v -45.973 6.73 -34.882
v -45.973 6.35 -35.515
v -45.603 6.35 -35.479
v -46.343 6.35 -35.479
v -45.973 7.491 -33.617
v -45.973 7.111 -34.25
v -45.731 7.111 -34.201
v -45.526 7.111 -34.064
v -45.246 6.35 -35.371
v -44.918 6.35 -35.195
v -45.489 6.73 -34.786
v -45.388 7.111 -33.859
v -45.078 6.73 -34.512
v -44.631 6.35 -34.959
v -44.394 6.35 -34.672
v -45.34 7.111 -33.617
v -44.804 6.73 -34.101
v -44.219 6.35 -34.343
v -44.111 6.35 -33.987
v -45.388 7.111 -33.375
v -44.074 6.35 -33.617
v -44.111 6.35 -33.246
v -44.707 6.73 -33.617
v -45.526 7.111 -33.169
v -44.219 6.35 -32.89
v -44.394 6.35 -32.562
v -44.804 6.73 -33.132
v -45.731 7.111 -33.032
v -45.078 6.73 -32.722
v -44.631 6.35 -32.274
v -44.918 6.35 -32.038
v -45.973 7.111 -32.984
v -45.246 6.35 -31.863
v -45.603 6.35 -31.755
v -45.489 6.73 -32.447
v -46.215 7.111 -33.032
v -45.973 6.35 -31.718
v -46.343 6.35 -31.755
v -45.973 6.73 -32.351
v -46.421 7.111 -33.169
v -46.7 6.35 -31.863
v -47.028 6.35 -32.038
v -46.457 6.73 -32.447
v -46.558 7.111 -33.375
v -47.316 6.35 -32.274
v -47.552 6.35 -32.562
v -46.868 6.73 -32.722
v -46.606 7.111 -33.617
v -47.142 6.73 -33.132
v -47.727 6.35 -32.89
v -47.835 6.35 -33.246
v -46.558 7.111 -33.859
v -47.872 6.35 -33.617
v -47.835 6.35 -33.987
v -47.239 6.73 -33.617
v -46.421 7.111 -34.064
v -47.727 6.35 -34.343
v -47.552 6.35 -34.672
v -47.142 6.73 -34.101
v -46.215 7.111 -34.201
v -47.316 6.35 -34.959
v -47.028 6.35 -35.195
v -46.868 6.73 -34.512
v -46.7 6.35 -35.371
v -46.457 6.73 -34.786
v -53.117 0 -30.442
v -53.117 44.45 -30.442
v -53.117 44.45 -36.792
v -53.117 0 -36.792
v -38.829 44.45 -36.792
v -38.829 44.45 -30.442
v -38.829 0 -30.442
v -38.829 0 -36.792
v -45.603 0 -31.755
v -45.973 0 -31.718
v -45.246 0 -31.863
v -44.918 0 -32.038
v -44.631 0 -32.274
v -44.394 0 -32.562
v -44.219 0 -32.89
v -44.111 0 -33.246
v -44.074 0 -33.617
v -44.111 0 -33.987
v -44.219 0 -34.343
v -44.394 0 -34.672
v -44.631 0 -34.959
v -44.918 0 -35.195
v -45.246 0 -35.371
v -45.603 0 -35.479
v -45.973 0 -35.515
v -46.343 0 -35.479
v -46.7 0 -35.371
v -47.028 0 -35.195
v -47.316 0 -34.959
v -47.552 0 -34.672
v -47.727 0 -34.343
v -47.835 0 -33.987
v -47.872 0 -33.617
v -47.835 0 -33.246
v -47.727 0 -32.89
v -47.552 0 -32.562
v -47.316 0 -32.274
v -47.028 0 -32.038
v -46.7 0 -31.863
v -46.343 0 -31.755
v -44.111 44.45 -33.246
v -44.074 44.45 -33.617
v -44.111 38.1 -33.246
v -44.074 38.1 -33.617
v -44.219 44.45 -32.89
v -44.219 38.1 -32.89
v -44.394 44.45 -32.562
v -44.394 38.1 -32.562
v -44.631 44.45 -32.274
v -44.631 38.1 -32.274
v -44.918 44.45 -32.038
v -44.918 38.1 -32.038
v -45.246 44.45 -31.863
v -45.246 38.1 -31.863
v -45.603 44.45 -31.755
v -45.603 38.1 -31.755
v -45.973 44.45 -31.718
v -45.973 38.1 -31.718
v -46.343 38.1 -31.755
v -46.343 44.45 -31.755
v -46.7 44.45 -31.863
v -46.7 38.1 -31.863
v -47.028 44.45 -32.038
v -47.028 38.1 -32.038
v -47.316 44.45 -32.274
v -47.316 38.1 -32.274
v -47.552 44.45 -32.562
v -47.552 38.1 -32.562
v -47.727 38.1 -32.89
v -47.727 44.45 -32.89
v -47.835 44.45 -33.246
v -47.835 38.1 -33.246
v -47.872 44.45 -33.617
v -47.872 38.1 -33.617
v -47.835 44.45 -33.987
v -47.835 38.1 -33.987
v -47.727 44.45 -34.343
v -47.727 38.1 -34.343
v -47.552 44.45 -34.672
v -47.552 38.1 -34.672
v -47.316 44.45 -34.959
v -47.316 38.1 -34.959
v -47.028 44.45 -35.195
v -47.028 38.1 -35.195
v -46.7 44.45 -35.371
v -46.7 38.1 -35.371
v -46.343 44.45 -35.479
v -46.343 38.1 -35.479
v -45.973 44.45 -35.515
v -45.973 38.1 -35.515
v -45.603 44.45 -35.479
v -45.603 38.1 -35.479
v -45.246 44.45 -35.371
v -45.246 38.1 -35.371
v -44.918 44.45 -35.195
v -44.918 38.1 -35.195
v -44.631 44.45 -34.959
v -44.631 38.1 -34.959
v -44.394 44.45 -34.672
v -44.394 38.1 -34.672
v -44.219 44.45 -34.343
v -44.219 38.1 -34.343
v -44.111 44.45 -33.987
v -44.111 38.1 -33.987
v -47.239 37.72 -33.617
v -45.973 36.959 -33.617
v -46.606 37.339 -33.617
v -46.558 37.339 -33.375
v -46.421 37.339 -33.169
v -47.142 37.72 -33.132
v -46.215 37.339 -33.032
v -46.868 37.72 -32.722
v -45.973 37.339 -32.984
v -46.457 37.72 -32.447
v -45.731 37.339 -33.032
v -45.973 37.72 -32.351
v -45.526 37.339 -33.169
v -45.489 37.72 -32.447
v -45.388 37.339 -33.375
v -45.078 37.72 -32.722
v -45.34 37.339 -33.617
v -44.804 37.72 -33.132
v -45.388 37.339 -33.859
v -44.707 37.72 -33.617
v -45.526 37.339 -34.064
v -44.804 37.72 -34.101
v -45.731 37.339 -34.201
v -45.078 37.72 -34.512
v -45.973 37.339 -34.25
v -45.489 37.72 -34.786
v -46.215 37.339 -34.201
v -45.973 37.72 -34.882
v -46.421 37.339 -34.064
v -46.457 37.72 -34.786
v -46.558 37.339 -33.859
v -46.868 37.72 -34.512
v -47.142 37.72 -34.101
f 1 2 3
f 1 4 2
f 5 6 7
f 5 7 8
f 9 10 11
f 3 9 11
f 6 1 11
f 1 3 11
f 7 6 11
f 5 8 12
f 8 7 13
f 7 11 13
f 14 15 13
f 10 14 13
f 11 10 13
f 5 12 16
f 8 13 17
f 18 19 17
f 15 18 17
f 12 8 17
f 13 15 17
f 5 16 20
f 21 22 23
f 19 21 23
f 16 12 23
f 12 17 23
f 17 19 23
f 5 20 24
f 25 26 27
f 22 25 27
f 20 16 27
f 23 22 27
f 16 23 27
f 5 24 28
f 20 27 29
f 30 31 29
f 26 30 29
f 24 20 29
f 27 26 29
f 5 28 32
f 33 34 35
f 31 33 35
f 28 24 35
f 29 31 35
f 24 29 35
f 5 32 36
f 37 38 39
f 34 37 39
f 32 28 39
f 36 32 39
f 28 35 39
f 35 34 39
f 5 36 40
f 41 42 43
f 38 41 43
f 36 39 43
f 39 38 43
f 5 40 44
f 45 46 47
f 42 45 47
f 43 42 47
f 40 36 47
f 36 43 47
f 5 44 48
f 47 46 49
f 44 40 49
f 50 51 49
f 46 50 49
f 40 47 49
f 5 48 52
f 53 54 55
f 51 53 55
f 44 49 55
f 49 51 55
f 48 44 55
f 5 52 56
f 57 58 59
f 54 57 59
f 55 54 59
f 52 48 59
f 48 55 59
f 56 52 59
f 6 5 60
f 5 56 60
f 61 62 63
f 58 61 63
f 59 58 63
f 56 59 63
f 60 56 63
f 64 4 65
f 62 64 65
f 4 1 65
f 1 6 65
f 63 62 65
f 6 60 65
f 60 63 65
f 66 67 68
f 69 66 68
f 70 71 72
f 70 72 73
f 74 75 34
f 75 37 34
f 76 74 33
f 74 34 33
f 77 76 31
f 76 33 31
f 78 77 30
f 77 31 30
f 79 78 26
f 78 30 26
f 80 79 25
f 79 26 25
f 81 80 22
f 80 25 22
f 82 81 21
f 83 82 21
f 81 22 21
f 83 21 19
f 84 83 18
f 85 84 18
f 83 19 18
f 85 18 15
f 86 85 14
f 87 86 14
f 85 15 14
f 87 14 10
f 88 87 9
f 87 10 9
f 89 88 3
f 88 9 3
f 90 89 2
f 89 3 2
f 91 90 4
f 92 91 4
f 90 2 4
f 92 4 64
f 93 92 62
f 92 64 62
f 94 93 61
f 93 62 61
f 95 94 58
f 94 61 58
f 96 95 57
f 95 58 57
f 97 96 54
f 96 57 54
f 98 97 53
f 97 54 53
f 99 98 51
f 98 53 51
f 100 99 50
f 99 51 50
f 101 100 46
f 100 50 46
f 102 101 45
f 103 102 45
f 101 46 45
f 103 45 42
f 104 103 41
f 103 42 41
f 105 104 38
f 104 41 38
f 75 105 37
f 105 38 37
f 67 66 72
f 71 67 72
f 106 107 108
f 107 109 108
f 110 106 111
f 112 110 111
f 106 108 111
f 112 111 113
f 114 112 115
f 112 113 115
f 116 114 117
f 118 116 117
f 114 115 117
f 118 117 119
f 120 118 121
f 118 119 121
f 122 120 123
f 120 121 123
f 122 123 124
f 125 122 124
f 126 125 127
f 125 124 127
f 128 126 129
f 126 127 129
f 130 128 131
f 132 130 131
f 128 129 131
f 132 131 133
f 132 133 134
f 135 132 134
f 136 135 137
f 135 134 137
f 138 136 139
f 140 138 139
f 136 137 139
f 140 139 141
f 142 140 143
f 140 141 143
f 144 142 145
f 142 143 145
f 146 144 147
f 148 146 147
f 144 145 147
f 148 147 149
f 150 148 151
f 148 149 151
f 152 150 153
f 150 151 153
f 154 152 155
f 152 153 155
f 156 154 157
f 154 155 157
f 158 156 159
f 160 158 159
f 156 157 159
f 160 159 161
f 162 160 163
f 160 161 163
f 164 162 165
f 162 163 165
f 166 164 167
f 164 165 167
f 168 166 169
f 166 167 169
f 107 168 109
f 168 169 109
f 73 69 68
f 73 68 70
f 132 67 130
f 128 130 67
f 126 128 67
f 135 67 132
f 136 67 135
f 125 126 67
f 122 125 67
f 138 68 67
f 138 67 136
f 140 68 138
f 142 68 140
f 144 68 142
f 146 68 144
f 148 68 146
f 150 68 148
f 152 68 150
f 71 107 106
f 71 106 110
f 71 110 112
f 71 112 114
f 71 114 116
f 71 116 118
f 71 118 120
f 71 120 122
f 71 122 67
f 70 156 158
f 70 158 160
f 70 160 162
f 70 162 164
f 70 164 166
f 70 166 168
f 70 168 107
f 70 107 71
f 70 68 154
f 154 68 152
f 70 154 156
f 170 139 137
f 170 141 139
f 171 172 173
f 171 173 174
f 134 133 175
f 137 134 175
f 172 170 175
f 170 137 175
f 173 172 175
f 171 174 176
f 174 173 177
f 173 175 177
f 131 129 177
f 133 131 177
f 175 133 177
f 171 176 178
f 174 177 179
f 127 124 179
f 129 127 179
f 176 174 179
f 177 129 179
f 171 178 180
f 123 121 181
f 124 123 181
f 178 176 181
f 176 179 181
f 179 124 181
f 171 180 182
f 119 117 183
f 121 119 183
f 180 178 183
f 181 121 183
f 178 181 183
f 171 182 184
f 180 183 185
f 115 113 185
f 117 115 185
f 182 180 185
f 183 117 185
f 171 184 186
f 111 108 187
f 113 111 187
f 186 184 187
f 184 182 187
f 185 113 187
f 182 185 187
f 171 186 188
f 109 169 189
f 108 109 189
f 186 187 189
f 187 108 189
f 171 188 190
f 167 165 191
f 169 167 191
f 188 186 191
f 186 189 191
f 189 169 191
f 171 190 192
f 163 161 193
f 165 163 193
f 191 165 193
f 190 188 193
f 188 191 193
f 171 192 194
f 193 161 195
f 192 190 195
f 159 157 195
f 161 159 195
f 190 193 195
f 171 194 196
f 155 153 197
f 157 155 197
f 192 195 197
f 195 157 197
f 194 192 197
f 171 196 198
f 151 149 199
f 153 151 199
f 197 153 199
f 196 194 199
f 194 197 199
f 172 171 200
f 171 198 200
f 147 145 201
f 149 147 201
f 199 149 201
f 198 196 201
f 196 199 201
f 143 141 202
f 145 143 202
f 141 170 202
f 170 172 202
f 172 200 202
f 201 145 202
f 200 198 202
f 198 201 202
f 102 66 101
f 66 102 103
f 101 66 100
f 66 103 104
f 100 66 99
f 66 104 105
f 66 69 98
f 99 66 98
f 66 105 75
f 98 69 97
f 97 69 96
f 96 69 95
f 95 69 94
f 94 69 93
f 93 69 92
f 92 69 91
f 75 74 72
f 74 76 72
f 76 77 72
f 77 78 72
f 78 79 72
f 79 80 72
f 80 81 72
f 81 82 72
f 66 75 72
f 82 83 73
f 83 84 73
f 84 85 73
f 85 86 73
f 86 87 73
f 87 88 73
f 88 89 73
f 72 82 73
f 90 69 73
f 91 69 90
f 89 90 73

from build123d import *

# Parameters (mm, degrees)
SKETCH1_W                 = 14.2875
SKETCH1_H                 = 6.35
EXTRUDE1_DEPTH            = 44.45
F_6_CLEARANCE_HOLE1_D     = 3.7973
F_6_CLEARANCE_HOLE1_DEPTH = 6.35
F_6_CLEARANCE_HOLE1_TIP   = 1.140824014
F_6_CLEARANCE_HOLE2_D     = 3.7973
F_6_CLEARANCE_HOLE2_DEPTH = 6.35
F_6_CLEARANCE_HOLE2_TIP   = 1.140824014


with BuildPart() as part:
    # Sketch1 → Extrude1 (new body)
    with BuildSketch(Plane(origin=(0, 0, 0), x_dir=(1, 0, 0), z_dir=(0, 1, 0))):
        with Locations((-45.973078165, 33.616731266)):
            Rectangle(SKETCH1_W, SKETCH1_H)
    extrude(amount=EXTRUDE1_DEPTH)

    # #6 Clearance Hole1
    with Locations(Plane(origin=(0, 44.45, 0), x_dir=(-1, 0, 0), z_dir=(0, 1, 0))):
        with Locations((45.973078165, -33.616731266)):
            Hole(F_6_CLEARANCE_HOLE1_D / 2, depth=F_6_CLEARANCE_HOLE1_DEPTH)
            with Locations((0, 0, -(F_6_CLEARANCE_HOLE1_DEPTH + F_6_CLEARANCE_HOLE1_TIP / 2))):  # 118° drill point
                Cone(0, F_6_CLEARANCE_HOLE1_D / 2, F_6_CLEARANCE_HOLE1_TIP, mode=Mode.SUBTRACT)

    # #6 Clearance Hole2
    with Locations(Plane(origin=(-45.973078165, 0, -33.616731266), x_dir=(0, 0, -1), z_dir=(0, -1, 0))):
        with Locations((0, 0)):
            Hole(F_6_CLEARANCE_HOLE2_D / 2, depth=F_6_CLEARANCE_HOLE2_DEPTH)
            with Locations((0, 0, -(F_6_CLEARANCE_HOLE2_DEPTH + F_6_CLEARANCE_HOLE2_TIP / 2))):  # 118° drill point
                Cone(0, F_6_CLEARANCE_HOLE2_D / 2, F_6_CLEARANCE_HOLE2_TIP, mode=Mode.SUBTRACT)


solid = part.part
